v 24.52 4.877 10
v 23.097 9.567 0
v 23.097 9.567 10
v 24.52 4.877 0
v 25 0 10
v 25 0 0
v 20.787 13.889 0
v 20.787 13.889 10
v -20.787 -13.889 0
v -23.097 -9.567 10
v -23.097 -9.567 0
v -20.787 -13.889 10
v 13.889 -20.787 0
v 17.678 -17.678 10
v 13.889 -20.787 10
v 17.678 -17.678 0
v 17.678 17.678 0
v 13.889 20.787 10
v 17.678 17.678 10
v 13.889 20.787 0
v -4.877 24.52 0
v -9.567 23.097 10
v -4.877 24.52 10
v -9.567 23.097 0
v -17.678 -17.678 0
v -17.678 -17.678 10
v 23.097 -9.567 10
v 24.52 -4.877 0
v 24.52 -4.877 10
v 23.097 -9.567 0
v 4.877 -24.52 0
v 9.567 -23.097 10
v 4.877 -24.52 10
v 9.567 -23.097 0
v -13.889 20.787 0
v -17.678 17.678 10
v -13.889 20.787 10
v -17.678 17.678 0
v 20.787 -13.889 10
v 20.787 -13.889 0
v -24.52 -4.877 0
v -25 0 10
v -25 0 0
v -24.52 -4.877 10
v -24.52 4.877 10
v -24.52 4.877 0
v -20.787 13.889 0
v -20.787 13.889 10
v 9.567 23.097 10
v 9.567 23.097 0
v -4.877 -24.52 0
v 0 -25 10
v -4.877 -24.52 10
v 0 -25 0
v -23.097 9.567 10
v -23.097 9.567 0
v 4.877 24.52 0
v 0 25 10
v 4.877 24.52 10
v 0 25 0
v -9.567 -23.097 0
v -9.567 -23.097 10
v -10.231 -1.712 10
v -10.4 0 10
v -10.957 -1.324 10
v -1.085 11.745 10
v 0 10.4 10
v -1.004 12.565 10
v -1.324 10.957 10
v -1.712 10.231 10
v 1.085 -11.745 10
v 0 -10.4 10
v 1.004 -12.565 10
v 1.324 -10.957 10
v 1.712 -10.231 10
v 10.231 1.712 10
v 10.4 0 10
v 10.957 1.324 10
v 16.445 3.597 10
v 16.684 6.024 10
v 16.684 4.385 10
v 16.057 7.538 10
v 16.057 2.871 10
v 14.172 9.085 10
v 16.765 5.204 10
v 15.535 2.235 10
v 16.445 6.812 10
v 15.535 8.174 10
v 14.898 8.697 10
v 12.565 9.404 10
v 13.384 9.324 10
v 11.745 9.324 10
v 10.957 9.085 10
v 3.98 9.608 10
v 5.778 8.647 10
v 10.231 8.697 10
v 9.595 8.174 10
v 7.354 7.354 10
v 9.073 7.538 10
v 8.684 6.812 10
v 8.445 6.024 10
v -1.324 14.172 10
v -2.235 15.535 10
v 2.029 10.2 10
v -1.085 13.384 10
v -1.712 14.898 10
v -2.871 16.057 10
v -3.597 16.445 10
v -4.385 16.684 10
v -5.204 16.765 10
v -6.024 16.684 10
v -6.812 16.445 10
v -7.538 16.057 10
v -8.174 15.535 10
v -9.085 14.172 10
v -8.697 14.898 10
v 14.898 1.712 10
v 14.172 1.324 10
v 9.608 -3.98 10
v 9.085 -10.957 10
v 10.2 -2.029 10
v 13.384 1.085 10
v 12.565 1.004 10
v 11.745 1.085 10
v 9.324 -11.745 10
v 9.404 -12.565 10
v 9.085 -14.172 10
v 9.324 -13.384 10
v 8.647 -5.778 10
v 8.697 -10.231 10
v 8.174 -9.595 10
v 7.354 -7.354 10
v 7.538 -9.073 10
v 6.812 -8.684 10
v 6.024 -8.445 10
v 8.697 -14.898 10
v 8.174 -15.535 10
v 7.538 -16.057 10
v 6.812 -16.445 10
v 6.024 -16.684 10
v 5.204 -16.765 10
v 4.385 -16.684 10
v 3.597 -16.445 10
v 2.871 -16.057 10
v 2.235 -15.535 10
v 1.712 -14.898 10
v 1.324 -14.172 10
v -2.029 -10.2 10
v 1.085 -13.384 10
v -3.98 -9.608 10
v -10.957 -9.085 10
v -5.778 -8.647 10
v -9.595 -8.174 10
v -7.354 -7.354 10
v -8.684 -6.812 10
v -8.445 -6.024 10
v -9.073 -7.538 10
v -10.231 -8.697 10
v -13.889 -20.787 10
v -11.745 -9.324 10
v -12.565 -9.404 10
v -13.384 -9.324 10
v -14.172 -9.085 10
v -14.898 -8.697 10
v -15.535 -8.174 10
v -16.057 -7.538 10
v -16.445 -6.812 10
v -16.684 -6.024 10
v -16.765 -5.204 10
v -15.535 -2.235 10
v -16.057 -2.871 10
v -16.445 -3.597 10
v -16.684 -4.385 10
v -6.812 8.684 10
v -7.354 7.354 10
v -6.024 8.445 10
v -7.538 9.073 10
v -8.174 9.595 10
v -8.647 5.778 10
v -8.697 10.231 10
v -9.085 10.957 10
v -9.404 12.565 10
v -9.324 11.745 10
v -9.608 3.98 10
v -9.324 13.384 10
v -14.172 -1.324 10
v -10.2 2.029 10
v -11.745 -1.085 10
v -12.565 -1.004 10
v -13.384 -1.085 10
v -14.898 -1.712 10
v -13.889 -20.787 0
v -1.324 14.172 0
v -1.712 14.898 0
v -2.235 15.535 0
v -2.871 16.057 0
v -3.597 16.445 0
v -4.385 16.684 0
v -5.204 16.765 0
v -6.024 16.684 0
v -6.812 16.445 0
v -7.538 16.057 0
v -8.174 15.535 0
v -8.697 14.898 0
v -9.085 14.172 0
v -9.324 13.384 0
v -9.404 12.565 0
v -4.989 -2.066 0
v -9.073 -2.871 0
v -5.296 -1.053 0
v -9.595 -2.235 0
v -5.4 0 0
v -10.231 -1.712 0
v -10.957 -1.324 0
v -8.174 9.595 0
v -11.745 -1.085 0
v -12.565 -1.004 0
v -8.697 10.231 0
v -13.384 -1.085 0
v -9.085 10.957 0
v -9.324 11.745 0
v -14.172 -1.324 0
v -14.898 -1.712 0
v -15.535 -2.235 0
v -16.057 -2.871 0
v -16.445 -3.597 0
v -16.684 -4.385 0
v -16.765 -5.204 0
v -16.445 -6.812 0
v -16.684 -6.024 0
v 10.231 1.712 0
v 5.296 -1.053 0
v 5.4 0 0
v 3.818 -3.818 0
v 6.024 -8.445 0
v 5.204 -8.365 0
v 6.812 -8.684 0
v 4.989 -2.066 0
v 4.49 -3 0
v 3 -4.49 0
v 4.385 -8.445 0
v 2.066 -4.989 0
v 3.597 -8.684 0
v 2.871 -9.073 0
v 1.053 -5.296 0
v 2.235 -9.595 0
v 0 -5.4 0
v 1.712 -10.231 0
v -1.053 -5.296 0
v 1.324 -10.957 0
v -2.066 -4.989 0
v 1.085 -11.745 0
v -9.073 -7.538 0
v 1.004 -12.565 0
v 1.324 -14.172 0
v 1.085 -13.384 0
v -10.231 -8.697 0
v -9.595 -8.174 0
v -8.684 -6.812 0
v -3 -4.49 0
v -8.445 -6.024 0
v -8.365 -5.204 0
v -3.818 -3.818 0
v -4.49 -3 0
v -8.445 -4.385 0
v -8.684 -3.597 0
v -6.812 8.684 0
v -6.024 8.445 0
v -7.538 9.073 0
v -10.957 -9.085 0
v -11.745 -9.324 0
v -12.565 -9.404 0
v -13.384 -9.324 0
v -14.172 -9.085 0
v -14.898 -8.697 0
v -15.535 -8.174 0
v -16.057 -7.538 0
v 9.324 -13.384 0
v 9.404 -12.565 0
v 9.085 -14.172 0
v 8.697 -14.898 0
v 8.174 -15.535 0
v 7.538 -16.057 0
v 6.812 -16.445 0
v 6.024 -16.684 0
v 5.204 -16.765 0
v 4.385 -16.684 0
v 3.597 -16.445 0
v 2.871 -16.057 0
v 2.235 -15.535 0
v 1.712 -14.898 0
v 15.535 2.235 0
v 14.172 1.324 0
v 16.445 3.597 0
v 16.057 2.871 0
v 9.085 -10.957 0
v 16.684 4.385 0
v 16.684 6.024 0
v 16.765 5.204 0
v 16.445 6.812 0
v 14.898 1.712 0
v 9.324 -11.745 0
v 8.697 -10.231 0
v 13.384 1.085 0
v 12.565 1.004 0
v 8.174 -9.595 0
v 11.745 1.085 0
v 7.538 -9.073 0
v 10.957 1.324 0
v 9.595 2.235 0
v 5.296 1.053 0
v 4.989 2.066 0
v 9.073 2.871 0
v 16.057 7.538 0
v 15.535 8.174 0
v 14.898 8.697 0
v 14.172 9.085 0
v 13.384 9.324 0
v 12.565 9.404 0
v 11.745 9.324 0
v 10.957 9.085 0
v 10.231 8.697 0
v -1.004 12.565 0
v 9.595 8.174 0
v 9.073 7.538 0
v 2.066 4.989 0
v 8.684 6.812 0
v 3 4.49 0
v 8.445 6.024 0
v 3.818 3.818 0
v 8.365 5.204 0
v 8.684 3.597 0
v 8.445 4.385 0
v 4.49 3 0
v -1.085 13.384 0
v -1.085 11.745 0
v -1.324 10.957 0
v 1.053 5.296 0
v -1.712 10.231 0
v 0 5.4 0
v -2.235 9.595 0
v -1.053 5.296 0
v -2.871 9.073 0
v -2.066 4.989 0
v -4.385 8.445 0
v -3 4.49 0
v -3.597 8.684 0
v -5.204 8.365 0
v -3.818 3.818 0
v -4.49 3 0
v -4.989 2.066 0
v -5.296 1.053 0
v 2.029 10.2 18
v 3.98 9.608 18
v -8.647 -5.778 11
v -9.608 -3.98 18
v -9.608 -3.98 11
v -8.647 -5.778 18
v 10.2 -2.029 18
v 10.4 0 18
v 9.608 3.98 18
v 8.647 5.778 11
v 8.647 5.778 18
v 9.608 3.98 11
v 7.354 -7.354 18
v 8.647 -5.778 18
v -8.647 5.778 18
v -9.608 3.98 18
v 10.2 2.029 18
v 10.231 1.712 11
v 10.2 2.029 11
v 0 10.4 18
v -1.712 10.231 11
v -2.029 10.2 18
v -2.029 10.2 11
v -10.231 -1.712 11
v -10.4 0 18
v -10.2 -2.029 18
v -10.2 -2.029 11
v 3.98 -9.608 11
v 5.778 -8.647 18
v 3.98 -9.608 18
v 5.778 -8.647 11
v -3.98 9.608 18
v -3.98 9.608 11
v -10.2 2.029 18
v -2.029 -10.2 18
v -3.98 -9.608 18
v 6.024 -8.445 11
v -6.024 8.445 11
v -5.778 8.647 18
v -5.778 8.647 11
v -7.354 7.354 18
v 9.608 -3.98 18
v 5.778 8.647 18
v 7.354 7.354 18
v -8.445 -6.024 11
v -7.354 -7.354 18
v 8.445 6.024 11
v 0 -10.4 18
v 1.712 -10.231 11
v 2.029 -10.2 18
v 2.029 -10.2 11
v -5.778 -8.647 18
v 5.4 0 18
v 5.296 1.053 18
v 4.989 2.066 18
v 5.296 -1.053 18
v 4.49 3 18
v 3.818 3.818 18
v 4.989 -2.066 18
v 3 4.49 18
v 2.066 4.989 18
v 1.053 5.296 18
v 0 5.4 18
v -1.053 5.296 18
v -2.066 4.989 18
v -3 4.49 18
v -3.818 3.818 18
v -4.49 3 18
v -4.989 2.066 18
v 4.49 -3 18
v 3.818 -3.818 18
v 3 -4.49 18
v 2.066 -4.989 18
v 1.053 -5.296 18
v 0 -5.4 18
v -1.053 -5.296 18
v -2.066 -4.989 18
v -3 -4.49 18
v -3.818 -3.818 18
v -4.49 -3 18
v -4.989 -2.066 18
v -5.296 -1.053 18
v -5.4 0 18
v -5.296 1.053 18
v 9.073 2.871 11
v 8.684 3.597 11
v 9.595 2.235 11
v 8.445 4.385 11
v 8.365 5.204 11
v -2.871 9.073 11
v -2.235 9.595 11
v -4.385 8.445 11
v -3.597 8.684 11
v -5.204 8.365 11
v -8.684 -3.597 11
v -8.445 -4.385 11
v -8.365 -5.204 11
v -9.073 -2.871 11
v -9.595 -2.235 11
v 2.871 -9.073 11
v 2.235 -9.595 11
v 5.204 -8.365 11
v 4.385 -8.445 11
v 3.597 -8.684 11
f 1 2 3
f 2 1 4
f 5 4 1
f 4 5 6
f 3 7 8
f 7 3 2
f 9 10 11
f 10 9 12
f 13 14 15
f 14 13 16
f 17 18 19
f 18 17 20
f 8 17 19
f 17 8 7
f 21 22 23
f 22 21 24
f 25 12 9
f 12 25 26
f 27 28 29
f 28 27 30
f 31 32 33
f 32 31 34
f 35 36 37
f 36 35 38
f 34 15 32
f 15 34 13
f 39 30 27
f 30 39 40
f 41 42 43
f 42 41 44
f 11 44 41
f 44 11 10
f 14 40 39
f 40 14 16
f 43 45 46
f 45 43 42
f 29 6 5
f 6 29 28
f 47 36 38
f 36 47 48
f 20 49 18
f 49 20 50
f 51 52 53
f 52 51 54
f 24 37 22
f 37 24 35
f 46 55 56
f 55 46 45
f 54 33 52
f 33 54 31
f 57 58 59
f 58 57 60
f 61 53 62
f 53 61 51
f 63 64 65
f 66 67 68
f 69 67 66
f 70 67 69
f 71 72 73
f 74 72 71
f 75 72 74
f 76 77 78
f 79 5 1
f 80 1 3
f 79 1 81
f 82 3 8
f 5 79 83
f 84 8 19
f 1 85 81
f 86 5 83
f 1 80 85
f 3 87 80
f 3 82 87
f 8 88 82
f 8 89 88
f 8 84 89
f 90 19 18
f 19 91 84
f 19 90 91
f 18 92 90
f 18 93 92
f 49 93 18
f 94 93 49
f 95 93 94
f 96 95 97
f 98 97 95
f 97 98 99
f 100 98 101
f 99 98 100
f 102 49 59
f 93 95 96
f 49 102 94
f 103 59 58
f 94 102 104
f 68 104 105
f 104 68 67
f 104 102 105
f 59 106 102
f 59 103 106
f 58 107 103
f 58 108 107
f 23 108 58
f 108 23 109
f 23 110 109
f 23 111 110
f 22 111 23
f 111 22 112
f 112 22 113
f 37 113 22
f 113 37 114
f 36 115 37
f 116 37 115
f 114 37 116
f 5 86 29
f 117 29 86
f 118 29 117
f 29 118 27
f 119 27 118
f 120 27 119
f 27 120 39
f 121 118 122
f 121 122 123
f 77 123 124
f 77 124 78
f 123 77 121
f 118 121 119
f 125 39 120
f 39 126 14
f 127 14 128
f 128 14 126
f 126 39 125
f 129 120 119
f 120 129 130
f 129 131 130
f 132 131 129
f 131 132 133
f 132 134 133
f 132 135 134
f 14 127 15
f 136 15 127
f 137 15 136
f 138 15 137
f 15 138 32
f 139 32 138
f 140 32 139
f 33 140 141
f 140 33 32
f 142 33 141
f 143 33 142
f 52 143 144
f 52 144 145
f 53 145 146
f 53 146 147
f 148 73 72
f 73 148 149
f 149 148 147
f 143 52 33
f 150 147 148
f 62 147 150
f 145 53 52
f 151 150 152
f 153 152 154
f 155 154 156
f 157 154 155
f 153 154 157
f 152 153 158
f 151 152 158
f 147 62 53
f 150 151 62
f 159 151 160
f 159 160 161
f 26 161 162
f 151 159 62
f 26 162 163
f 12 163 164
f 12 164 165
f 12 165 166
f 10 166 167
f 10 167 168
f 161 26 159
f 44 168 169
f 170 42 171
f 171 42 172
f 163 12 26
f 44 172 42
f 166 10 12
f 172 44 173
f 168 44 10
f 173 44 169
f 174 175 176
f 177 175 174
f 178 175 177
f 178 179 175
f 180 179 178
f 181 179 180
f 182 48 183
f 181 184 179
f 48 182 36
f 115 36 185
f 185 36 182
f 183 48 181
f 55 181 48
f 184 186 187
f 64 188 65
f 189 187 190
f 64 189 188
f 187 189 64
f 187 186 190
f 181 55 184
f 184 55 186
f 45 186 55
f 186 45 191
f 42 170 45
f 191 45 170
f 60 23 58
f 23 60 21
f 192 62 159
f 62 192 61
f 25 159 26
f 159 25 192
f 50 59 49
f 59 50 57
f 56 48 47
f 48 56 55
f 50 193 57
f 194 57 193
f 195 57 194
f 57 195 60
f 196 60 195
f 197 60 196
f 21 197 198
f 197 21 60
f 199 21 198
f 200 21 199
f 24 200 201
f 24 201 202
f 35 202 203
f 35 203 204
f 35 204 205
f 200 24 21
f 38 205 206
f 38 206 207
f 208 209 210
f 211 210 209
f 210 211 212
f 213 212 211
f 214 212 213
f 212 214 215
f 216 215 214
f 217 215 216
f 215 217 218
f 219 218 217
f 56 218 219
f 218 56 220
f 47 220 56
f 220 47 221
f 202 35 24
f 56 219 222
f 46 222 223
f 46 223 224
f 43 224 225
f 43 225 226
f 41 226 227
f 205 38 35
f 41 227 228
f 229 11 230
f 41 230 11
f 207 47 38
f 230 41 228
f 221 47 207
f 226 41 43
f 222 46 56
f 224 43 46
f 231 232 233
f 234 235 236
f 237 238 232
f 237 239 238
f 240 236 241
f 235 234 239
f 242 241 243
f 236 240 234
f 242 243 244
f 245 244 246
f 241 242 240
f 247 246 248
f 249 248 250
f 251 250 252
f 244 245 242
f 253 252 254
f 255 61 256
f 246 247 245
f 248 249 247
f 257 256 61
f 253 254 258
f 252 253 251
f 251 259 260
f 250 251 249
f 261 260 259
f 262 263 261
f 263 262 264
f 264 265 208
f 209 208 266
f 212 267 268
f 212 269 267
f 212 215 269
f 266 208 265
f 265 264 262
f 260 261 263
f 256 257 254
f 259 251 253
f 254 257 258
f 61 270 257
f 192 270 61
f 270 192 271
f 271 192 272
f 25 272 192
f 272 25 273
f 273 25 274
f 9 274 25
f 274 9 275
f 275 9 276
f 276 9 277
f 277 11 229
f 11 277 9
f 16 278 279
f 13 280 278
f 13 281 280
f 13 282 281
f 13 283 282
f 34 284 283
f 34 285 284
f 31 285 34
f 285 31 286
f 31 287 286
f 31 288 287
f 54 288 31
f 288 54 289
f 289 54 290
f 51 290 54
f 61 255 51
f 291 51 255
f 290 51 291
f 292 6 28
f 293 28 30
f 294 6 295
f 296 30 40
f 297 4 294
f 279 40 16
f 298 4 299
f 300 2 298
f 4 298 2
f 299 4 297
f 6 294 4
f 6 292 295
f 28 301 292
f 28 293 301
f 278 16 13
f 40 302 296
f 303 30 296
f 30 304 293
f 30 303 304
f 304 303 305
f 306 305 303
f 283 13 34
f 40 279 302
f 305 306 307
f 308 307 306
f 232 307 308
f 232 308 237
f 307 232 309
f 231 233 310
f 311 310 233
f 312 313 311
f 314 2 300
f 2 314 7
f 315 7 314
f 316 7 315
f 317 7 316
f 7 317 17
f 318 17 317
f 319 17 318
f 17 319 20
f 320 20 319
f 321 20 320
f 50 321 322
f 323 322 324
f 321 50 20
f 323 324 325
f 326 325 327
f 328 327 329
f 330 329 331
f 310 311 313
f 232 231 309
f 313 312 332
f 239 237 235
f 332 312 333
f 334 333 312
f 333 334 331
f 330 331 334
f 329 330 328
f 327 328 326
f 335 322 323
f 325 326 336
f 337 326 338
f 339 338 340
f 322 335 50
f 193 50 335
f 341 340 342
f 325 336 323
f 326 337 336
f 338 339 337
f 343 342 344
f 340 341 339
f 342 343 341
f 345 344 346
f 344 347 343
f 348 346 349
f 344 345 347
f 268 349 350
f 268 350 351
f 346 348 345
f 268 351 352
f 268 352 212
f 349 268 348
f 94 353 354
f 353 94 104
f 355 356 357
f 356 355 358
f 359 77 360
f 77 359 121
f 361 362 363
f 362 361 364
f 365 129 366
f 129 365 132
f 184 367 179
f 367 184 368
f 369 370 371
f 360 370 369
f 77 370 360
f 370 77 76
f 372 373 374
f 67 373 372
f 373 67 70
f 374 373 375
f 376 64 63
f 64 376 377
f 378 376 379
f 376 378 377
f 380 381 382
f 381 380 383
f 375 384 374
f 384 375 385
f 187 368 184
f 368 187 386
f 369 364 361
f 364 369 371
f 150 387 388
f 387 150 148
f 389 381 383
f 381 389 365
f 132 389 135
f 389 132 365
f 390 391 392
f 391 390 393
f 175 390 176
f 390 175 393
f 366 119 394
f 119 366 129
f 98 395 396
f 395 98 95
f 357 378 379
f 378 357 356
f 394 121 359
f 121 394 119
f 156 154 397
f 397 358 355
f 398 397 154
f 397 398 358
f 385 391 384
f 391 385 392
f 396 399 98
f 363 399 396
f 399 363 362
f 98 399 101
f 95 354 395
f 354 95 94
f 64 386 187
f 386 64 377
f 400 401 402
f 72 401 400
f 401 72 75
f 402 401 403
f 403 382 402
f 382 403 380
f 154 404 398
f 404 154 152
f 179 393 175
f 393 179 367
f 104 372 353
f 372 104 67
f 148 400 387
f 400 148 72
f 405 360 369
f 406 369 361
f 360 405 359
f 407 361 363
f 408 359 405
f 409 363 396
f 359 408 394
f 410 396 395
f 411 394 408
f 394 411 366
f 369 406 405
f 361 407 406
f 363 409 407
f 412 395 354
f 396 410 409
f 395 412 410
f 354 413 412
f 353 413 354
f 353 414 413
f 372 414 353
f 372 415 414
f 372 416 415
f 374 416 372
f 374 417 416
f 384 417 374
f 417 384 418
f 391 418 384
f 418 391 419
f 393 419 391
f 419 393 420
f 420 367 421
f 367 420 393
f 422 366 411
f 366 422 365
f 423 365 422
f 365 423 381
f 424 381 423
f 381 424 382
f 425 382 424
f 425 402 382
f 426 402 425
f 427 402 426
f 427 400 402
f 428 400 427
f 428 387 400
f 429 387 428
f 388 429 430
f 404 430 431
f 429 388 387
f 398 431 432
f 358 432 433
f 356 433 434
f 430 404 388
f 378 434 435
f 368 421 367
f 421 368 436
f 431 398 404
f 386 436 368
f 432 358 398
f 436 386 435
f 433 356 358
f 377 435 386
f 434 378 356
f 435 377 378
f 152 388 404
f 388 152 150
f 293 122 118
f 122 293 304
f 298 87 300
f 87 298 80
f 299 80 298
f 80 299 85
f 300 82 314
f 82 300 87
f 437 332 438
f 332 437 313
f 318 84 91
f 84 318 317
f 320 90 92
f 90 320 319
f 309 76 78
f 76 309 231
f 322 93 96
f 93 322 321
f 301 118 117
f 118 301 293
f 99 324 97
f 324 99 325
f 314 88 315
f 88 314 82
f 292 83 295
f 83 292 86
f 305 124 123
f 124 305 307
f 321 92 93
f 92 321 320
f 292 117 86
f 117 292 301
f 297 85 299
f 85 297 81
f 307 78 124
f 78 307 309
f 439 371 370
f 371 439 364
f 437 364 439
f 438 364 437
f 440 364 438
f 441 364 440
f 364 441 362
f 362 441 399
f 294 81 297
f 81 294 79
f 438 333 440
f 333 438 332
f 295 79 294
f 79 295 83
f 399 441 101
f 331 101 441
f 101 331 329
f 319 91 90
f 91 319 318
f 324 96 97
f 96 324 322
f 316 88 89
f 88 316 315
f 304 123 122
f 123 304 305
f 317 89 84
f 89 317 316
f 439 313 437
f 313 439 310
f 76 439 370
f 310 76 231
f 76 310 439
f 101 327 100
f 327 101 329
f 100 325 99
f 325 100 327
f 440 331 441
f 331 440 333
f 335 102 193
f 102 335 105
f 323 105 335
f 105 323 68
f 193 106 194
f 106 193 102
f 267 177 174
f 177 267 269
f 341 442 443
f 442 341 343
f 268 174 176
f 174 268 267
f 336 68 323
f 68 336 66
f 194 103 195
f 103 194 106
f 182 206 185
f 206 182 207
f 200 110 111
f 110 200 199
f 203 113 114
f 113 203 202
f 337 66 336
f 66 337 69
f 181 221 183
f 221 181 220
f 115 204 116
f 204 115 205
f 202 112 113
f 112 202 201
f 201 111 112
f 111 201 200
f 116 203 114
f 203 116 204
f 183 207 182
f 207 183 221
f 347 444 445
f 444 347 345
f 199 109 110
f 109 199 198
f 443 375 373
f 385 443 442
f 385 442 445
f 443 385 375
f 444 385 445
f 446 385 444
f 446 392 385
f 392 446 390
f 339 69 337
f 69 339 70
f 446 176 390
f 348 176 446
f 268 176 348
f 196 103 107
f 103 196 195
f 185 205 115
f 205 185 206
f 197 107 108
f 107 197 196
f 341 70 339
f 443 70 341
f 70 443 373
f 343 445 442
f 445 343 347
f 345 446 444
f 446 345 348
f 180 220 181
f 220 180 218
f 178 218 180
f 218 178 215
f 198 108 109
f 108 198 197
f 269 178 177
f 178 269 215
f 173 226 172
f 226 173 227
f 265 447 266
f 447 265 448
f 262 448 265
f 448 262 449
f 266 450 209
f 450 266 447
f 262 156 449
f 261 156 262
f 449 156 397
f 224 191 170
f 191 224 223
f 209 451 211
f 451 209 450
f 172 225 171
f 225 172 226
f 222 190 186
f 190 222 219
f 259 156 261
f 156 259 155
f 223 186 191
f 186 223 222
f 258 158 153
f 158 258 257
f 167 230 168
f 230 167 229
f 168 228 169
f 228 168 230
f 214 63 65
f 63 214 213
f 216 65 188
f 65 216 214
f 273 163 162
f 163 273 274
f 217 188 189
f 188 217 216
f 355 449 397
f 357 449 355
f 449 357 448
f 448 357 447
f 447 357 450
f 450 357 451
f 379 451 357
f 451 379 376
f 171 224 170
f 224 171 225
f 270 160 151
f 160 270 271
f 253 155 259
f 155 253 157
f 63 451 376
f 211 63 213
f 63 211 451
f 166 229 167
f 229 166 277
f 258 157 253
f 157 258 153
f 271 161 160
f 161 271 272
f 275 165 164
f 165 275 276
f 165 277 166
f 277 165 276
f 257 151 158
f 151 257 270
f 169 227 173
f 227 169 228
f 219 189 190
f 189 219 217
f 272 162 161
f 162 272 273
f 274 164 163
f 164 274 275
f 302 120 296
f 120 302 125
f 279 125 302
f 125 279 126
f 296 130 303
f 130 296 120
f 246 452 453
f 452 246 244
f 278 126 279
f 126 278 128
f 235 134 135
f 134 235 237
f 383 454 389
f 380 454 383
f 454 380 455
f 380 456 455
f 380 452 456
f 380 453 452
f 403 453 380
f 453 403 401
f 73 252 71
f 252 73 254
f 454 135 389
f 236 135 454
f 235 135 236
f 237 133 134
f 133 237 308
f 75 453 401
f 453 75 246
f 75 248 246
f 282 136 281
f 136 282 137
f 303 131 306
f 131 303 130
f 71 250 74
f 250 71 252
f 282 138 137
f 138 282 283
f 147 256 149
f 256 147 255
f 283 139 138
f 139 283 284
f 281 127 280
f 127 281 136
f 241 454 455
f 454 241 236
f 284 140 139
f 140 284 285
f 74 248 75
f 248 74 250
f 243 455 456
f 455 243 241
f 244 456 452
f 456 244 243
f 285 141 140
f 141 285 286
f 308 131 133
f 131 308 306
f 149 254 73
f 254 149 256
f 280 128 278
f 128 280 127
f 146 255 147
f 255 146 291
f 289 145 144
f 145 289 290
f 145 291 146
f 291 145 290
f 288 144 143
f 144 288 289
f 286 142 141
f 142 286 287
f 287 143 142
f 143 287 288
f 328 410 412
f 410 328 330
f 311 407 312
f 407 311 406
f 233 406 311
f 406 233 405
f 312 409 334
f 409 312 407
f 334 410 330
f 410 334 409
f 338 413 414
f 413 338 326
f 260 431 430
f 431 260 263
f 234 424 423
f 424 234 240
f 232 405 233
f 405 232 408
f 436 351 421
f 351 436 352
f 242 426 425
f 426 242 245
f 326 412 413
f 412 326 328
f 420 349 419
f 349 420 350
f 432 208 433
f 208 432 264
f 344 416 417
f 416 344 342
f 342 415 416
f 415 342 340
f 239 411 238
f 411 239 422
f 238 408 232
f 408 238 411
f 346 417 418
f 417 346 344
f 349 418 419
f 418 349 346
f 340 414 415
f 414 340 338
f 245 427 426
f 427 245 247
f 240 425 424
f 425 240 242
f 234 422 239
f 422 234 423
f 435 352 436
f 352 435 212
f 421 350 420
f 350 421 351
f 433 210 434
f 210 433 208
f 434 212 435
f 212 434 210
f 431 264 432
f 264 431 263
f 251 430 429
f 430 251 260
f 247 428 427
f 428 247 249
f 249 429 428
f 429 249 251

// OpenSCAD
$fn = 32;

// ----------------------------------------------------------------------
// Flange Ø50 x 10
// 4 holes on a Ø27.2 bolt circle, bolted joints
// ----------------------------------------------------------------------

// --- parameters (mm) ---
flange_d = 50;     // outside diameter of the flange
thickness = 10;    // flange thickness
holes = 4;         // number of bolt holes
pcd = 27.2;        // bolt circle diameter
start_deg = 22.5;  // angle of the first hole, from +X
hole_d = 8.4;      // bolt hole diameter
bore_d = 10.8;     // central through bore
hub_d = 20.8;      // hub outside diameter
hub_h = 8;         // hub height above the flange face (0 = no hub)

// --- derived feature positions (mm) ---
height = thickness + hub_h;  // = 18   overall height of the part
pcd_r = pcd / 2;             // = 13.6   bolt circle radius
hole_step = 360 / holes;     // = 90   angular pitch
feature_centers = [
  [pcd_r * cos(start_deg + 0 * hole_step), pcd_r * sin(start_deg + 0 * hole_step)],
  [pcd_r * cos(start_deg + 1 * hole_step), pcd_r * sin(start_deg + 1 * hole_step)],
  [pcd_r * cos(start_deg + 2 * hole_step), pcd_r * sin(start_deg + 2 * hole_step)],
  [pcd_r * cos(start_deg + 3 * hole_step), pcd_r * sin(start_deg + 3 * hole_step)]
];   // bolt hole centres on the pitch circle

// flange disc, every hole and the bore cut straight through
difference() {
  union() {
    cylinder(d = flange_d, h = thickness);
    cylinder(d = hub_d, h = height);  // hub, overlapped into the flange
  }
  translate([0, 0, -1]) cylinder(d = bore_d, h = height + 2);  // bore, through
  for (centre = feature_centers)
    translate([centre[0], centre[1], -1]) cylinder(d = hole_d, h = thickness + 2);
}
